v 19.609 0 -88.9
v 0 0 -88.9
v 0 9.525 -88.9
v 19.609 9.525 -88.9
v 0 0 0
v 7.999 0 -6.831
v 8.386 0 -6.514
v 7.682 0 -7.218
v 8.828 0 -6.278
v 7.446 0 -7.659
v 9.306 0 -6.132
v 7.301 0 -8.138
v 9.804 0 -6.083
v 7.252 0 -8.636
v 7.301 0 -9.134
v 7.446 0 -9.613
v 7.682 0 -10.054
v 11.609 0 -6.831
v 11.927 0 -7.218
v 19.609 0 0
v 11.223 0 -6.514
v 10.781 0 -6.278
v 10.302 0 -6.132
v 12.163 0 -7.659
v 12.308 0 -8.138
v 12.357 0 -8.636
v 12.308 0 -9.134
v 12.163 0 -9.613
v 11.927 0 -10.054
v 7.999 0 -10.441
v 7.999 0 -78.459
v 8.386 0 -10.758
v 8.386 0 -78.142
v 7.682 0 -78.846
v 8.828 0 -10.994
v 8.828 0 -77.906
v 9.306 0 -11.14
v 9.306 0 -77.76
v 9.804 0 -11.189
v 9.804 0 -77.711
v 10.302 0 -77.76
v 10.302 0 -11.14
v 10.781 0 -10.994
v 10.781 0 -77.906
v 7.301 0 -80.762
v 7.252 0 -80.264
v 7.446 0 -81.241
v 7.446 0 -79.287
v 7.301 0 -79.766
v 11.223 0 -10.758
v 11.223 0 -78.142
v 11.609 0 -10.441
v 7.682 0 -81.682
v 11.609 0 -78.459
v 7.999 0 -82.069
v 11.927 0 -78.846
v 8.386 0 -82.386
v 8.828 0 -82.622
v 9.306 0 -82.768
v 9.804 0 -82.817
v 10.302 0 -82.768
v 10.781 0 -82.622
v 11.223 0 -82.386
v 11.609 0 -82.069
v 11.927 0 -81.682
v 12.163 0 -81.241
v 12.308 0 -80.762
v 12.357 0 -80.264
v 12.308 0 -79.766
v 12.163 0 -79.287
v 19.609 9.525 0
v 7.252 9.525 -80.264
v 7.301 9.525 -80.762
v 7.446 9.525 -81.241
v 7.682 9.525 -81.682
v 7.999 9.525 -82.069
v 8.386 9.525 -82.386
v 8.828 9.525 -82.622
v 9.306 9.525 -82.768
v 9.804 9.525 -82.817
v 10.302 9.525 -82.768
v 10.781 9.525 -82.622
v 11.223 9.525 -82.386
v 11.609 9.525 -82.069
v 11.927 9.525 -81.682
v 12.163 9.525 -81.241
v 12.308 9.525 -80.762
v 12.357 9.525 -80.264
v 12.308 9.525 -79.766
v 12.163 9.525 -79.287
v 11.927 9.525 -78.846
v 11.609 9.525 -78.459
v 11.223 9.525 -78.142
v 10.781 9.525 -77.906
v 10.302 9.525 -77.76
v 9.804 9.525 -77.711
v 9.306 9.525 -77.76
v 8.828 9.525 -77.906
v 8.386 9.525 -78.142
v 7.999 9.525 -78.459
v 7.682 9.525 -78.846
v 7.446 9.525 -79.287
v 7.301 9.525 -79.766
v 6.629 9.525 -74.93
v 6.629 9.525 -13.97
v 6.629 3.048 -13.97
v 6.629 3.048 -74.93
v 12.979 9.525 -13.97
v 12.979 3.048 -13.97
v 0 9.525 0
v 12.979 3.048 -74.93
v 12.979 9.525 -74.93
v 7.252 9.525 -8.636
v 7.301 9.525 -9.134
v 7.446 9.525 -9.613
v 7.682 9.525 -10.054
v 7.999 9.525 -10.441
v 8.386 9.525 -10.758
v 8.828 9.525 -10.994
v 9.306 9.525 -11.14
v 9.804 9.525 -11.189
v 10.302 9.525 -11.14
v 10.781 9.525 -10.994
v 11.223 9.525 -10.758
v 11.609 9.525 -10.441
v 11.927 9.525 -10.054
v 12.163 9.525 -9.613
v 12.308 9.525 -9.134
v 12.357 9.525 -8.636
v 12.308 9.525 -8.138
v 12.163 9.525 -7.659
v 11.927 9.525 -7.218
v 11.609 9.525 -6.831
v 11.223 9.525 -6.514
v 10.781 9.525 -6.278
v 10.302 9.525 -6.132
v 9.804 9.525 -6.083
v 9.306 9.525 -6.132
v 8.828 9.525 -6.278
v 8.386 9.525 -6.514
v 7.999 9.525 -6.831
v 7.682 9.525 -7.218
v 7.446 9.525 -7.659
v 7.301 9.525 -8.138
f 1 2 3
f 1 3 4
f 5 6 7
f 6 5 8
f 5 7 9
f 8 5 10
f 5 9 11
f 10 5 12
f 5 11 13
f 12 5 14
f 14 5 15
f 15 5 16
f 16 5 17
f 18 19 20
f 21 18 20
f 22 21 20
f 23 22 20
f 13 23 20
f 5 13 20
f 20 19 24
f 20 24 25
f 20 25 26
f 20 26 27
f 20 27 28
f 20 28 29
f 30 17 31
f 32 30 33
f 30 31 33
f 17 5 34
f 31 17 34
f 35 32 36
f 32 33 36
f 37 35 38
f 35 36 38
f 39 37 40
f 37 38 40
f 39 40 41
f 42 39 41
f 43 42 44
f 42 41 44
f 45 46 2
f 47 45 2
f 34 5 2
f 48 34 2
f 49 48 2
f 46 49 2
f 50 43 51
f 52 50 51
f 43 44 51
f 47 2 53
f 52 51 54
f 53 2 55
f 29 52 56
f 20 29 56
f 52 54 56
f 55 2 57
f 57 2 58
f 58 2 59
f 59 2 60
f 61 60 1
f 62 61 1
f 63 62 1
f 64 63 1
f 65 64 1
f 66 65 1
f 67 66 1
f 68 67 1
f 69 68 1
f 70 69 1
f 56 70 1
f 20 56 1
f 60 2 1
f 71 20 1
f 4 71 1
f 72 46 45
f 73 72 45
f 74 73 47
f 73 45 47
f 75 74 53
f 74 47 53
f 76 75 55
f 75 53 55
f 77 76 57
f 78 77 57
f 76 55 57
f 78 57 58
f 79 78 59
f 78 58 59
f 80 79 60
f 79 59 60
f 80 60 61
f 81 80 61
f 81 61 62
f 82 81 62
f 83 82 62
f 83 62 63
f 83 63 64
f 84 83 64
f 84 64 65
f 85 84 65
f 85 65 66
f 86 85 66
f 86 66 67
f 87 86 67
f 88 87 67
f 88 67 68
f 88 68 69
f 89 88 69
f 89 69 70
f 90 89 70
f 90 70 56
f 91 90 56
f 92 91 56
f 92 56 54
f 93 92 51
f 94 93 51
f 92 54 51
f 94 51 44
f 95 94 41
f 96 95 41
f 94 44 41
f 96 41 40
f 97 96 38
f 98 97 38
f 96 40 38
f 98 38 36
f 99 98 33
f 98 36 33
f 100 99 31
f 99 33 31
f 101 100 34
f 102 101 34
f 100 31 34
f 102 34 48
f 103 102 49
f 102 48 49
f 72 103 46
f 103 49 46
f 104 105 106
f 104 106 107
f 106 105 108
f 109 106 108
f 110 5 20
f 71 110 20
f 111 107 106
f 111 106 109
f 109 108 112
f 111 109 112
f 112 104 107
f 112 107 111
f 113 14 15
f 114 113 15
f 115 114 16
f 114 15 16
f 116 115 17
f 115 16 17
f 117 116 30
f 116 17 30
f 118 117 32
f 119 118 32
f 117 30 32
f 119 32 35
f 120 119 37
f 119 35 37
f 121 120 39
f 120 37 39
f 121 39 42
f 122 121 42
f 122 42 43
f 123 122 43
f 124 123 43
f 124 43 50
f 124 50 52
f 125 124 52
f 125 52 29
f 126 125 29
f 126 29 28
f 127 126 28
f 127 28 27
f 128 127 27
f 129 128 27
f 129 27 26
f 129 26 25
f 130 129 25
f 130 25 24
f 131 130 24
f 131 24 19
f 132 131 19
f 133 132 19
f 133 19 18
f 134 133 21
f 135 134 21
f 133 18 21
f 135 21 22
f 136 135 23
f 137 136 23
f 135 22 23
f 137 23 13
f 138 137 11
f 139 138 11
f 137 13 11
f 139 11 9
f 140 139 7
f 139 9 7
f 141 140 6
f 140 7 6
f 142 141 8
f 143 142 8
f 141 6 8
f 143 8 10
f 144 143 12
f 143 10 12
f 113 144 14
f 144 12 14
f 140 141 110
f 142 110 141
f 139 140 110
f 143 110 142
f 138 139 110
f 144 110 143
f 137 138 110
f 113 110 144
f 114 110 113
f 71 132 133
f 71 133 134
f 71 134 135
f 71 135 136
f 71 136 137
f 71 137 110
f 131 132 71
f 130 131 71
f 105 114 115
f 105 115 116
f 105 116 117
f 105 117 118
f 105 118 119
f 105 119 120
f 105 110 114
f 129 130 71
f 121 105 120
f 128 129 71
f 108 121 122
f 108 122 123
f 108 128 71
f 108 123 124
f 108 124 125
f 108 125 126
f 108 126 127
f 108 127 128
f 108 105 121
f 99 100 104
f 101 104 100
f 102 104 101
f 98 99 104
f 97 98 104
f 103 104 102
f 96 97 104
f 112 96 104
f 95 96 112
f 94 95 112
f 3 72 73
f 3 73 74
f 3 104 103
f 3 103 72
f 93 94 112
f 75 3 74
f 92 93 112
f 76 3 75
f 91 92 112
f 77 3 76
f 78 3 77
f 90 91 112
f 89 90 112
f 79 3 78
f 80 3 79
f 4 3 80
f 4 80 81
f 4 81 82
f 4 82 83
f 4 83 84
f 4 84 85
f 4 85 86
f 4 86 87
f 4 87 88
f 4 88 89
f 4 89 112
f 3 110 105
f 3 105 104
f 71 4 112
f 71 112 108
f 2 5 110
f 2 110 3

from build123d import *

# Parameters (mm, degrees)
SKETCH1_W                  = 19.6088
SKETCH1_H                  = 88.9
SKETCH1_R                  = 2.54
BOSS_EXTRUDE1_DEPTH        = 9.525
SKETCH2_W                  = 6.35
SKETCH2_H                  = 60.96
CUT_EXTRUDE1_DEPTH         = 6.477
F_10_32_TAPPED_HOLE4_D     = 5.1054
F_10_32_TAPPED_HOLE4_DEPTH = 16.51
F_10_32_TAPPED_HOLE4_TIP   = 1.533816902


with BuildPart() as part:
    # Sketch1 → Boss-Extrude1 (new body)
    with BuildSketch(Plane(origin=(0, 0, 0), x_dir=(1, 0, 0), z_dir=(0, 1, 0))):
        with Locations((9.8044, 44.45)):
            Rectangle(SKETCH1_W, SKETCH1_H)
        with Locations((9.8044, 80.264)):
            Circle(SKETCH1_R, mode=Mode.SUBTRACT)
        with Locations((9.8044, 8.636)):
            Circle(SKETCH1_R, mode=Mode.SUBTRACT)
    extrude(amount=BOSS_EXTRUDE1_DEPTH)

    # Sketch2 → Cut-Extrude1 (cut)
    with BuildSketch(Plane(origin=(0, 9.525, 0), x_dir=(1, 0, 0), z_dir=(0, 1, 0))):
        with Locations((9.8044, 44.45)):
            Rectangle(SKETCH2_W, SKETCH2_H)
    extrude(amount=-CUT_EXTRUDE1_DEPTH, mode=Mode.SUBTRACT)

    # #10-32 Tapped Hole4
    with Locations(Plane(origin=(0, 9.525, 0), x_dir=(1, 0, 0), z_dir=(0, 1, 0))):
        with Locations((9.8044, 80.264), (9.8044, 8.636)):
            Hole(F_10_32_TAPPED_HOLE4_D / 2, depth=F_10_32_TAPPED_HOLE4_DEPTH)
            with Locations((0, 0, -(F_10_32_TAPPED_HOLE4_DEPTH + F_10_32_TAPPED_HOLE4_TIP / 2))):  # 118° drill point
                Cone(0, F_10_32_TAPPED_HOLE4_D / 2, F_10_32_TAPPED_HOLE4_TIP, mode=Mode.SUBTRACT)


solid = part.part
